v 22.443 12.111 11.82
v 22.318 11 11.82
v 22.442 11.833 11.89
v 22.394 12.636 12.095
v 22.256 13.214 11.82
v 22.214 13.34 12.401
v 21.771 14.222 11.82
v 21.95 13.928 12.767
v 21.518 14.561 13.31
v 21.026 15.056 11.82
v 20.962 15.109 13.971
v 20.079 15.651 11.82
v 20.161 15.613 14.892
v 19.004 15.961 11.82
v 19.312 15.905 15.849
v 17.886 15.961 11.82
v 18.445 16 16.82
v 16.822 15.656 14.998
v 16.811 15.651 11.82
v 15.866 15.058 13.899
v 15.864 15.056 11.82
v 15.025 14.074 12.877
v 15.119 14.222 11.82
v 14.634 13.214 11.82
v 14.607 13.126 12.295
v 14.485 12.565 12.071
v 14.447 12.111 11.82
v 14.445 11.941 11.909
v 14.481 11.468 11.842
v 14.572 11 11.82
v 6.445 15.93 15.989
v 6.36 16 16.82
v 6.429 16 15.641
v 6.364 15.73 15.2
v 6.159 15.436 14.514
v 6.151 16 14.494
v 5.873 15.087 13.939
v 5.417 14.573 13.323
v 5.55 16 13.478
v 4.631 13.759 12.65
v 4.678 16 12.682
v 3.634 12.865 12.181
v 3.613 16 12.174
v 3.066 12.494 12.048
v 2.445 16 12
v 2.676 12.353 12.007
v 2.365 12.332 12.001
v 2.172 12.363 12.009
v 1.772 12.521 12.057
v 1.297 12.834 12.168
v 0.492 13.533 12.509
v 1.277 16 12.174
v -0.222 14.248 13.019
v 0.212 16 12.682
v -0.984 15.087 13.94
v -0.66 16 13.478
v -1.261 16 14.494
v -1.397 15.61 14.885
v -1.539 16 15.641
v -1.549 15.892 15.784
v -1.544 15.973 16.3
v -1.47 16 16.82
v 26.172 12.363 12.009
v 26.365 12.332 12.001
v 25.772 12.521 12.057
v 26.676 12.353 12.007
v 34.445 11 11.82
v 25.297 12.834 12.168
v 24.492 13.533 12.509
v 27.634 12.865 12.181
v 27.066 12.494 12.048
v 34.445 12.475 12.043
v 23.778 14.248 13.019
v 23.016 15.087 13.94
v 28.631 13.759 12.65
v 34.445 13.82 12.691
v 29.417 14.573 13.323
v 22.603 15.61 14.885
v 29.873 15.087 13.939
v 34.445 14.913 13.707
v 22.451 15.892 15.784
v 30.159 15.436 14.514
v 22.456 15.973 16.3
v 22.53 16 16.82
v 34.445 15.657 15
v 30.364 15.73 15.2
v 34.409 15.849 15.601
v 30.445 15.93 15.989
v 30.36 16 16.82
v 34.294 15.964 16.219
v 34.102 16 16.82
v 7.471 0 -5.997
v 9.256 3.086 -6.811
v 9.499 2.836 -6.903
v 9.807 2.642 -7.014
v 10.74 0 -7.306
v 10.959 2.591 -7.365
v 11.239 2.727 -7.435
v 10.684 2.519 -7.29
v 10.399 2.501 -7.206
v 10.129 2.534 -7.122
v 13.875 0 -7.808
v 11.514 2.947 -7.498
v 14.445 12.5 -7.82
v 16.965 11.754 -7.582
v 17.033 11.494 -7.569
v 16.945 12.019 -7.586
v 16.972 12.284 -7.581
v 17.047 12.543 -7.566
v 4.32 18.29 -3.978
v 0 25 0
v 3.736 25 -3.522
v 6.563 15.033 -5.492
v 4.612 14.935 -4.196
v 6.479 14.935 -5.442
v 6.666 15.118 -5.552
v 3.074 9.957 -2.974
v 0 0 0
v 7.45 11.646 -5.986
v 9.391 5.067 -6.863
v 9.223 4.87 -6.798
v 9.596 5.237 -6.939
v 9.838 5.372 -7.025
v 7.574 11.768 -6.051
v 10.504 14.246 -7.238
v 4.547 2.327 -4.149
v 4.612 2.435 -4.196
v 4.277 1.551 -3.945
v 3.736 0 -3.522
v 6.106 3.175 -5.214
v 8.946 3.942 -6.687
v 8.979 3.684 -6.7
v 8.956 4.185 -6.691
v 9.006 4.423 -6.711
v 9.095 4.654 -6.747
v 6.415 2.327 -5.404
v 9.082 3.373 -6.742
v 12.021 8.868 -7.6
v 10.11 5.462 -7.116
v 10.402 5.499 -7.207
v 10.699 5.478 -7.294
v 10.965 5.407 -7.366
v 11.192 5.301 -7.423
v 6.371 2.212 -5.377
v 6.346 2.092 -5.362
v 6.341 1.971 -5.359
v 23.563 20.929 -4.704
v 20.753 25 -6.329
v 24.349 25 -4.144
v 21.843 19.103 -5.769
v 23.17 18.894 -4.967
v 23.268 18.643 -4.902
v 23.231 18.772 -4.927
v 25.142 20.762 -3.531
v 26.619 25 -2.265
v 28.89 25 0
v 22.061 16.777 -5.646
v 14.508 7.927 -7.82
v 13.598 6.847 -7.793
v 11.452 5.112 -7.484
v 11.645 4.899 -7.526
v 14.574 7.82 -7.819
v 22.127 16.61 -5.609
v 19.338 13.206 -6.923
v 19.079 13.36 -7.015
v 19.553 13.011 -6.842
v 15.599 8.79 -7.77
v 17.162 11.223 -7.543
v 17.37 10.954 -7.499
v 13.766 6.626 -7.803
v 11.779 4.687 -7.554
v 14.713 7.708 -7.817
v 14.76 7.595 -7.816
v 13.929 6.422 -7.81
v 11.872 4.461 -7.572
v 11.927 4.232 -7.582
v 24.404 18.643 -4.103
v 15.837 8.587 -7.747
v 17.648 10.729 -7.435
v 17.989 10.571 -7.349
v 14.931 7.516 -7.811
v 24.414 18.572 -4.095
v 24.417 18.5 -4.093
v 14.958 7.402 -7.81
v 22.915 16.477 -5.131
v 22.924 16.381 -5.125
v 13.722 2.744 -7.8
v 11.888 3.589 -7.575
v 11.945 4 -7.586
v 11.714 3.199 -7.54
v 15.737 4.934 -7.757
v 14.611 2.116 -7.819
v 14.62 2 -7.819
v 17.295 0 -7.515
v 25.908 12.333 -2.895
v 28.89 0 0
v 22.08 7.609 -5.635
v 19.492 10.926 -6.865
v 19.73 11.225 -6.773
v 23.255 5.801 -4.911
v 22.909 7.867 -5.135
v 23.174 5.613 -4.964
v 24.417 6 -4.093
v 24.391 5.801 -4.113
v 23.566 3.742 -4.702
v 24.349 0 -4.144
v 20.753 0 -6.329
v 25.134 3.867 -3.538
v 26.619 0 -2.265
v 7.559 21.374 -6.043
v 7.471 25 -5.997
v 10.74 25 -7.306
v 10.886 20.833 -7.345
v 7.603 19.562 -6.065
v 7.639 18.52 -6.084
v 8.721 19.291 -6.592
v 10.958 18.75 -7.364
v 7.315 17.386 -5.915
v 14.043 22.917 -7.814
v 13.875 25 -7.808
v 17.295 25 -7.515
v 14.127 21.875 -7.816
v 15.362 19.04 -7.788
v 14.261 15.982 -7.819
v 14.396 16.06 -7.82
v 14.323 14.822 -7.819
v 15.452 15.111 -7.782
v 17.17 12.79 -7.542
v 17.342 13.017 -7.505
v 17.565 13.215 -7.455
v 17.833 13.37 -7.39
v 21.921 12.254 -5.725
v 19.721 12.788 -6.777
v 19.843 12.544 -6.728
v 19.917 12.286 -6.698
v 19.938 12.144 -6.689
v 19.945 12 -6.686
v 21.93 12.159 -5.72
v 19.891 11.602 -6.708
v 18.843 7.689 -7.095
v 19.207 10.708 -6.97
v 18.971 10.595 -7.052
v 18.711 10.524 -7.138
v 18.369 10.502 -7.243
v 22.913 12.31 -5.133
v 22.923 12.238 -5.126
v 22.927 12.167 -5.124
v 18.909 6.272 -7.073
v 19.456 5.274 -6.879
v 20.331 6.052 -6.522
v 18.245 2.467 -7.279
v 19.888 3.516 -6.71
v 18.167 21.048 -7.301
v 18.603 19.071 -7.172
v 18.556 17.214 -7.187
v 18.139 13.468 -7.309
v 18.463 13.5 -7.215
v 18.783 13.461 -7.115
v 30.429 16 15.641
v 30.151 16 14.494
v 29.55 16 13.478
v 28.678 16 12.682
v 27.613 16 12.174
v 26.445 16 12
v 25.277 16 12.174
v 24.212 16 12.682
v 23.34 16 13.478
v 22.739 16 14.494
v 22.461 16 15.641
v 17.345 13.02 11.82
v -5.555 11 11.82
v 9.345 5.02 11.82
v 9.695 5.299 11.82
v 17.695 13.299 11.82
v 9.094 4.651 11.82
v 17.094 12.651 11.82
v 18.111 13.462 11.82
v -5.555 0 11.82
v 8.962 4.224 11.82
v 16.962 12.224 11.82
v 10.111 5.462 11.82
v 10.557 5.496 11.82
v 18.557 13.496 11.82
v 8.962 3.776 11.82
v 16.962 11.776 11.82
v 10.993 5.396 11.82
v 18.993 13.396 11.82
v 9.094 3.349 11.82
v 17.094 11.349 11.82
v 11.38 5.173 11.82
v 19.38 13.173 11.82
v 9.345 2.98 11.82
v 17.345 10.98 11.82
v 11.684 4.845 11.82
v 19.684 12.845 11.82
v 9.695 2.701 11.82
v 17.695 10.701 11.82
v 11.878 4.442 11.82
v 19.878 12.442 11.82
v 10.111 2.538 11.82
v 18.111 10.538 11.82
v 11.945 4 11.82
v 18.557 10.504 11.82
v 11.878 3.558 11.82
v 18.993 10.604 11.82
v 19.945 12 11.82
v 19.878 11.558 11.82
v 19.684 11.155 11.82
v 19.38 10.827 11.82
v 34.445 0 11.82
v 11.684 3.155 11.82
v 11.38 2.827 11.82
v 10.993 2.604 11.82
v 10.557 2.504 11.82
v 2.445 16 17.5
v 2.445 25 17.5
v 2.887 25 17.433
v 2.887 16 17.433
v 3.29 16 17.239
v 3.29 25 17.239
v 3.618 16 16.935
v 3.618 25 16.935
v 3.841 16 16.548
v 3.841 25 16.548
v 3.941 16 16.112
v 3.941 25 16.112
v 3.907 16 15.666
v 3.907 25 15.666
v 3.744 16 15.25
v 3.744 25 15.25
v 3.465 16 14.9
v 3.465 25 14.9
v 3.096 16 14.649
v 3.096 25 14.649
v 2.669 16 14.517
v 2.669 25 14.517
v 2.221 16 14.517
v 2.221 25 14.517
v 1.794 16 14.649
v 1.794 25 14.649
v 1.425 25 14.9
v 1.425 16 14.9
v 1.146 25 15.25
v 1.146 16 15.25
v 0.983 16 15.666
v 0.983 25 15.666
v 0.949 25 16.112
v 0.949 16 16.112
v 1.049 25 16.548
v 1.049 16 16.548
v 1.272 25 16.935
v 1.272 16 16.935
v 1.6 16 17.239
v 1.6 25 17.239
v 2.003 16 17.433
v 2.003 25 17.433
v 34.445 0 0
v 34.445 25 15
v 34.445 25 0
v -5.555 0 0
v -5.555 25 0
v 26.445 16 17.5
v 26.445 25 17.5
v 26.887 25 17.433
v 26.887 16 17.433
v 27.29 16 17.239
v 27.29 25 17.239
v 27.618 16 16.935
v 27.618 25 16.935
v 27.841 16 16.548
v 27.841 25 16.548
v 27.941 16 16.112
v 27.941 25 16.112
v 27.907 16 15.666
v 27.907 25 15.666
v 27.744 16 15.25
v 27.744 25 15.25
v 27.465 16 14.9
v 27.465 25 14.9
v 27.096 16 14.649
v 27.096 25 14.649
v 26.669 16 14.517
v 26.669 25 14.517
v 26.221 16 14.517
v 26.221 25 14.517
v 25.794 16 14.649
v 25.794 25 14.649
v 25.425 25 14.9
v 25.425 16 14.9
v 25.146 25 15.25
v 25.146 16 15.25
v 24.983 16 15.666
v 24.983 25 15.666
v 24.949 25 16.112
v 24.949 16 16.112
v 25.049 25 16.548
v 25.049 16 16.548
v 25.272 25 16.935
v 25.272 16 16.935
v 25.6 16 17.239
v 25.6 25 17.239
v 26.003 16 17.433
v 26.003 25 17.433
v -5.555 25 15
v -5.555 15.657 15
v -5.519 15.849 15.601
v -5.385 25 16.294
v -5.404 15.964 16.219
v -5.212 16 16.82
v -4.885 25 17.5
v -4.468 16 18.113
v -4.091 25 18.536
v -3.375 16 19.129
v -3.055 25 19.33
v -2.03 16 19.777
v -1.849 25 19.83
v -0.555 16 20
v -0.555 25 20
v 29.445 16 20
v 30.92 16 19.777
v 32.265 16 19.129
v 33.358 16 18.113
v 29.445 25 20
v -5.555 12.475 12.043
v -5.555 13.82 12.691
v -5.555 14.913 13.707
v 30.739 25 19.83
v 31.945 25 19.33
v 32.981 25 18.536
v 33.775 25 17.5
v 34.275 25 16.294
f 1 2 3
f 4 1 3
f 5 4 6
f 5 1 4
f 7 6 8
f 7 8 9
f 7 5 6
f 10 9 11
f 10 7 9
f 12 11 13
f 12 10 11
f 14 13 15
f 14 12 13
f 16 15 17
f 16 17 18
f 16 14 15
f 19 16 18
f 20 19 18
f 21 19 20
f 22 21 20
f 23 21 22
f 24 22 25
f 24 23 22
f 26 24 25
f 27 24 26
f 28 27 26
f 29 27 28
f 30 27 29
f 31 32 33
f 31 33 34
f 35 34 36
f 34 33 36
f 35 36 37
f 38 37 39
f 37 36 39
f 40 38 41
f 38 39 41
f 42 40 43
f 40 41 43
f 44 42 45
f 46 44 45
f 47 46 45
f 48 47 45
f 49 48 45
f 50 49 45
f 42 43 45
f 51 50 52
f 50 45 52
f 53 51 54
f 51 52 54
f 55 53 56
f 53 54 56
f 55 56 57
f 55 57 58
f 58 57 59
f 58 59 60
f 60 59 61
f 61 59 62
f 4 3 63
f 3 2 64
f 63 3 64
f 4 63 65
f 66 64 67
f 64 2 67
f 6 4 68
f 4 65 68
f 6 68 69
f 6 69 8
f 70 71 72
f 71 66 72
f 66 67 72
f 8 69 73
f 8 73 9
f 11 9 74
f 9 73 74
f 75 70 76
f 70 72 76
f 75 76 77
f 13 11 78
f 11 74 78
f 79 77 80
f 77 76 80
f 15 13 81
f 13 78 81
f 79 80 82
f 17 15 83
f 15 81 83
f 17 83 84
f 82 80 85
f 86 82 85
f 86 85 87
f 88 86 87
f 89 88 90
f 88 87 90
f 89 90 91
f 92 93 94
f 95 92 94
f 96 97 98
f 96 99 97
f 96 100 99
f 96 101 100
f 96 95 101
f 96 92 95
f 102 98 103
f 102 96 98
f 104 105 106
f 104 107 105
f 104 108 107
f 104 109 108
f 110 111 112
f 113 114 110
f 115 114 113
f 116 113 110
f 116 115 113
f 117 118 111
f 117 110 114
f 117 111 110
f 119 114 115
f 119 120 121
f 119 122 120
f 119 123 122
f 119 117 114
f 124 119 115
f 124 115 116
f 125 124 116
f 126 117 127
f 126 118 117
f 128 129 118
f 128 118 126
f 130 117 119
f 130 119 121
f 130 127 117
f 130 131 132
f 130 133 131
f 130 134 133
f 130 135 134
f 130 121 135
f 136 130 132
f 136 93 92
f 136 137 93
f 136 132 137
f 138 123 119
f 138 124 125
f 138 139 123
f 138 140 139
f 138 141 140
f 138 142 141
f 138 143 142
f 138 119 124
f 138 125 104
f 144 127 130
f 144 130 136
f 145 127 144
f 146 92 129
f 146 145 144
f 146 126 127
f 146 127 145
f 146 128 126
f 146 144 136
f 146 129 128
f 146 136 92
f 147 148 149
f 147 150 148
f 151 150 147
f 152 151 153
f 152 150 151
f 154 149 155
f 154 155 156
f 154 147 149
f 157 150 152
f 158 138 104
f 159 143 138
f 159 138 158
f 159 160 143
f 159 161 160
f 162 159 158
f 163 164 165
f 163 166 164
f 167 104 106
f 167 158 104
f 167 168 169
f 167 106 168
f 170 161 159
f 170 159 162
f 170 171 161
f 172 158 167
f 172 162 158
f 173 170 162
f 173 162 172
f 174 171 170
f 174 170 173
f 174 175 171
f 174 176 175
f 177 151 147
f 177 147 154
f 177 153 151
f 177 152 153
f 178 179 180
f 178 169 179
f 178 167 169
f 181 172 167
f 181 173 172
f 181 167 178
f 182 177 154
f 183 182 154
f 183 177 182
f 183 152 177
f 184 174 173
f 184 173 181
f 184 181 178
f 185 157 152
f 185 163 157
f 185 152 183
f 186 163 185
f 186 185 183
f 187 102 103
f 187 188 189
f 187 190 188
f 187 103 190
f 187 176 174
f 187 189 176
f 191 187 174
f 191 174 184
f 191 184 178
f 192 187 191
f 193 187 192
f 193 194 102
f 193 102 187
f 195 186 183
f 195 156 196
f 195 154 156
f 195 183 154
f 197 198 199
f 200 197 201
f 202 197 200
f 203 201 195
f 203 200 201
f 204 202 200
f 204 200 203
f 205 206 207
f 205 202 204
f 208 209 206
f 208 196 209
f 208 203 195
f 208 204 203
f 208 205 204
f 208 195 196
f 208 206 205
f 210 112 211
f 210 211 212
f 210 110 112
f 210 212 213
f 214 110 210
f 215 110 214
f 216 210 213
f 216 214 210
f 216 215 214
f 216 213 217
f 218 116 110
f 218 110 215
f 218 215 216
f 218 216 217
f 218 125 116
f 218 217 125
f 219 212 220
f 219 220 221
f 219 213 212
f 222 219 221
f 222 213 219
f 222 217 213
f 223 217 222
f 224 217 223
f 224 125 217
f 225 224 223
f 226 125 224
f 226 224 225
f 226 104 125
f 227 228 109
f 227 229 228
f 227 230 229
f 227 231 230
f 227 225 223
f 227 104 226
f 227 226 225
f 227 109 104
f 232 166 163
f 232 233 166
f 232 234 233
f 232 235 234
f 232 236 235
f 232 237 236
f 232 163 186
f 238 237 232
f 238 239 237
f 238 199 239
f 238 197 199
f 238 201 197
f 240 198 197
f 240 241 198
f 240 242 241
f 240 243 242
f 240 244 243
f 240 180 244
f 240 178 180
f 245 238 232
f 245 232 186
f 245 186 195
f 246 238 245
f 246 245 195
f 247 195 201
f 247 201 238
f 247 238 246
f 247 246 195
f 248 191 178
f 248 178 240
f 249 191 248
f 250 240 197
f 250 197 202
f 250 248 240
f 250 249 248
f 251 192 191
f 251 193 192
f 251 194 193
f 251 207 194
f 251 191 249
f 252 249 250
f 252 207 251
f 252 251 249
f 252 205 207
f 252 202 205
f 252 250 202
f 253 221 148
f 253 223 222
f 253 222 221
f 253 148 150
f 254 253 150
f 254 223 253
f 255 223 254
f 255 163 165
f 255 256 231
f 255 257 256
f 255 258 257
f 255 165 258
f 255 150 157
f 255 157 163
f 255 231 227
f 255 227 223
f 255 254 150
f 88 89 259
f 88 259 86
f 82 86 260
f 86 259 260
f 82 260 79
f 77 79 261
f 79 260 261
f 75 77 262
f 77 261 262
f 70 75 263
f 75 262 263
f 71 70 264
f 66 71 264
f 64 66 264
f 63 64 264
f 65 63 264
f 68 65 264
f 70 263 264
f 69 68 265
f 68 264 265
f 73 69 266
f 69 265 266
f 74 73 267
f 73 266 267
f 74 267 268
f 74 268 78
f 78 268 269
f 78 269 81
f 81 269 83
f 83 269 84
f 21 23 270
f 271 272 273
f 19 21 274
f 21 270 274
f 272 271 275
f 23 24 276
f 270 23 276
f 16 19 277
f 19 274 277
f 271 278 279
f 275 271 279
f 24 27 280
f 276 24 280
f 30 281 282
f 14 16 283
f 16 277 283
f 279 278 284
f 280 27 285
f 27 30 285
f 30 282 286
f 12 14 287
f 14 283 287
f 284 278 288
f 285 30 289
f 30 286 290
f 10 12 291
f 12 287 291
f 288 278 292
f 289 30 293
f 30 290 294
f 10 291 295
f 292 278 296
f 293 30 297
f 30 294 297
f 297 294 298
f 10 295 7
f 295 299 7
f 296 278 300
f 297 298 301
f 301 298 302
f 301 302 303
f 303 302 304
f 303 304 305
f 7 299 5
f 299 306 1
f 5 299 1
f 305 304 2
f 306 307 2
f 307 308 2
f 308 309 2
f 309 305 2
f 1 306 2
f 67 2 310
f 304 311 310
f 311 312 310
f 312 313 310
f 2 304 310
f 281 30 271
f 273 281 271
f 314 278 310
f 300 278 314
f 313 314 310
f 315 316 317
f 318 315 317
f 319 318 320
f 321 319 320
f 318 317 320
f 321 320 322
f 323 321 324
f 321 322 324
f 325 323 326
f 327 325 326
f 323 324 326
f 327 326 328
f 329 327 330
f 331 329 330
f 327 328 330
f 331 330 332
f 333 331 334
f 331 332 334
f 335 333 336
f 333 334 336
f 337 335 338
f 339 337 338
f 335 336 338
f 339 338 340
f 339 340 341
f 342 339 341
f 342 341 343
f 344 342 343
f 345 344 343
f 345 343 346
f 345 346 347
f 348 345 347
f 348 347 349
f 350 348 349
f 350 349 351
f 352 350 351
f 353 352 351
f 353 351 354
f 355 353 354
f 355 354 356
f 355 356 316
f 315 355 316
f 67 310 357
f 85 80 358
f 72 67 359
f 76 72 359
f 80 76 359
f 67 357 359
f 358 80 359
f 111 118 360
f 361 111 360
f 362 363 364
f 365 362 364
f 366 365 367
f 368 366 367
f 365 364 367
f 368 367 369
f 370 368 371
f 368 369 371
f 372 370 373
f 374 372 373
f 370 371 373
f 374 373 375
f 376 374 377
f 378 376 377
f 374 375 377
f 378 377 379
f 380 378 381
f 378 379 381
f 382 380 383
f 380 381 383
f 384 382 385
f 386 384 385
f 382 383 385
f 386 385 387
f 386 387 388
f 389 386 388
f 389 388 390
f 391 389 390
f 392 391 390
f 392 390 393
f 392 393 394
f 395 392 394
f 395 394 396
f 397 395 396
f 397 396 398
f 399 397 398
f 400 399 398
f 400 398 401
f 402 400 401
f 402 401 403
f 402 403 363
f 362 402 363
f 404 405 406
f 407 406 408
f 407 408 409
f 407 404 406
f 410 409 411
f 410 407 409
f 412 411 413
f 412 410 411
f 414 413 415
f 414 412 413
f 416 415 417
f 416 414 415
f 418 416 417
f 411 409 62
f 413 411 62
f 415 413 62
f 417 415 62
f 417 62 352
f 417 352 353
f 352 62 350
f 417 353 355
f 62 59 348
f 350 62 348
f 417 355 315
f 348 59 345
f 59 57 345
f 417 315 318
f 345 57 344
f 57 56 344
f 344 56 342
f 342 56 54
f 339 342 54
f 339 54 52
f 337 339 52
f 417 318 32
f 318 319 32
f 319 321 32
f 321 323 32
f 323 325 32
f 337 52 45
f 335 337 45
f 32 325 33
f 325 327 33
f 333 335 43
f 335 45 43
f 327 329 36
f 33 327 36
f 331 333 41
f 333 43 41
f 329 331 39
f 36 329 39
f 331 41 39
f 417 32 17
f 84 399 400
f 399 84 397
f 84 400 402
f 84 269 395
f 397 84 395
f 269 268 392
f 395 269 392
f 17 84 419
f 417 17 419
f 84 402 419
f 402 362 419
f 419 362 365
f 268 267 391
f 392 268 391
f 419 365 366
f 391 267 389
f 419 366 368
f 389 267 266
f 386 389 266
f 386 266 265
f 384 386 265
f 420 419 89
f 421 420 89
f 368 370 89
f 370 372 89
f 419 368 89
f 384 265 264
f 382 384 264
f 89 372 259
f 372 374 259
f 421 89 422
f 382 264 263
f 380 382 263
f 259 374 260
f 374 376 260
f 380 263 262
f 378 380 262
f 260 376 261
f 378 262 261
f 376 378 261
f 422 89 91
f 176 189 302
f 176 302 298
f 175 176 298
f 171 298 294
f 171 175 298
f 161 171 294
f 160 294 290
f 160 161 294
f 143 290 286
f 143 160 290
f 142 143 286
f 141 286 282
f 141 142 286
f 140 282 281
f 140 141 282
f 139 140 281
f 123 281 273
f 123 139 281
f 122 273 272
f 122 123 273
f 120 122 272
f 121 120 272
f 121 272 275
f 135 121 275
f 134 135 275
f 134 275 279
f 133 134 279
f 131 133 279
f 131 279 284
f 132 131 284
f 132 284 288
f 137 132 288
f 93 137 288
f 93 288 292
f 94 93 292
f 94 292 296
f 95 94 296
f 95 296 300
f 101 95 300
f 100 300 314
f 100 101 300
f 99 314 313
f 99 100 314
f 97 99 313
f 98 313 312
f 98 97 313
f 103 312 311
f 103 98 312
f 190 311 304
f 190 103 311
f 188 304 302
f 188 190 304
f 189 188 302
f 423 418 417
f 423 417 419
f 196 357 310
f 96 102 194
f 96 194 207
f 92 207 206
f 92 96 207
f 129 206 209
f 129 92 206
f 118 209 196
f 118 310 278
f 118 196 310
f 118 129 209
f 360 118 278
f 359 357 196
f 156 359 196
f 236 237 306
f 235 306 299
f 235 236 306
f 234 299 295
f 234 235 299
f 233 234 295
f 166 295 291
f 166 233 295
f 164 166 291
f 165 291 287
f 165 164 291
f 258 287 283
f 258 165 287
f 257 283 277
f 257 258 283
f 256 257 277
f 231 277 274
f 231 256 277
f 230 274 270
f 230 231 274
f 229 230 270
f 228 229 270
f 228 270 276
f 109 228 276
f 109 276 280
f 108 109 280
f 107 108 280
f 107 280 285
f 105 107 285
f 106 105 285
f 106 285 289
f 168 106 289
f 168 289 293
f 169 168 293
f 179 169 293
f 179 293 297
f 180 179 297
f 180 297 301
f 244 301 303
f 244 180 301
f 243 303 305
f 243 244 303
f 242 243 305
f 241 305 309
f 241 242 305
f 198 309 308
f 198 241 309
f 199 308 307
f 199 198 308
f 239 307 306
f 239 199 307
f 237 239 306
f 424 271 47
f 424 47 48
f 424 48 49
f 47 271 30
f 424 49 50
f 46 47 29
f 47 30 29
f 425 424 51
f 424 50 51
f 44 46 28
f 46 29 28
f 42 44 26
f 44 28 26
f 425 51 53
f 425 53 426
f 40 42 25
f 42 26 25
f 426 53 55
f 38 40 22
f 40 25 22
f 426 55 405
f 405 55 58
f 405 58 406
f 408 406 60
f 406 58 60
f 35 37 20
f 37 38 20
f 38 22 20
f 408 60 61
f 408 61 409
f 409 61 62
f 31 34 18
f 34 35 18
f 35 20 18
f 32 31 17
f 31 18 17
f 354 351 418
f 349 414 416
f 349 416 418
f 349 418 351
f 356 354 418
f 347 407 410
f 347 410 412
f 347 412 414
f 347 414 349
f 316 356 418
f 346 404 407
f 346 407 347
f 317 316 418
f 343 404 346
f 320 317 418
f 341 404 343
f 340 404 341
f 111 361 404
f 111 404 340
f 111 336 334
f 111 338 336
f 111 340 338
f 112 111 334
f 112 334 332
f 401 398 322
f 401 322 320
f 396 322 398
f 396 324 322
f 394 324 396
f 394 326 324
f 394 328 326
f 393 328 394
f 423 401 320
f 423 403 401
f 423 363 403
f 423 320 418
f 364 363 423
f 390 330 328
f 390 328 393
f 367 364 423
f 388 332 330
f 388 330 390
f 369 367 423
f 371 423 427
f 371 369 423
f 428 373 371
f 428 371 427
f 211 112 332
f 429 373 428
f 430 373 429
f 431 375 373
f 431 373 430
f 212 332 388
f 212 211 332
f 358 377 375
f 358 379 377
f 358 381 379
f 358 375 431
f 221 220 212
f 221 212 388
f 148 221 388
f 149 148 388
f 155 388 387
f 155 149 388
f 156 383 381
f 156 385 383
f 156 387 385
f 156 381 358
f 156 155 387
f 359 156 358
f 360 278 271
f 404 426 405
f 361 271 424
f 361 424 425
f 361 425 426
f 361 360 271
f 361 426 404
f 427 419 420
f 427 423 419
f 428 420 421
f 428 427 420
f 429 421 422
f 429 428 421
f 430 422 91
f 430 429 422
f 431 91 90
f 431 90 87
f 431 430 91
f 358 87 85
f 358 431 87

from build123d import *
from build123d.topology import SkipClean

# Parameters (mm, degrees)
BOSS_EXTRUDE1_DEPTH     = 25
SKETCH2_W               = 40
SKETCH2_H               = 9
BOSS_EXTRUDE2_DEPTH     = 8.18
FILLET1_R               = 5
CUT_EXTRUDE1_DEPTH      = 47.874168161
CUT_EXTRUDE1_DEPTH_BACK = 47.874168161
SKETCH3_R               = 1.5
SKETCH3_4_R             = 4
CUT_EXTRUDE6_DEPTH      = 47.874168161
SKETCH6_R               = 1.5
CUT_EXTRUDE7_DEPTH      = 48.026142101
CUT_EXTRUDE8_START      = -9
SKETCH6_3_R             = 4
CUT_EXTRUDE8_DEPTH      = 40
FILLET2_R               = 5


with BuildPart() as part:
    # Sketch1 → Boss-Extrude1 (new body)
    with BuildSketch(Plane(origin=(0, 0, 0), x_dir=(1, 0, 0), z_dir=(0, 1, 0))):
        with BuildLine():
            add(Edge.make_bspline(
                [(0, 0), (14.445, 15.64), (28.89, 0)],
                knots=[0, 0, 0, 1, 1, 1], degree=2))
            Line((28.89, 0), (0, 0))
        make_face()
        Polygon((-5.555, -11.82), (34.445, -11.82), (34.445, 0), (28.89, 0), (0, 0), (-5.555, 0), align=None)
    extrude(amount=BOSS_EXTRUDE1_DEPTH)

    # Sketch2 → Boss-Extrude2 (add)
    with BuildSketch(Plane.XY.offset(11.82)):
        with Locations((14.445, 20.5)):
            Rectangle(SKETCH2_W, SKETCH2_H)
    extrude(amount=BOSS_EXTRUDE2_DEPTH)

    # Fillet1
    fillet1_edges = [part.edges().sort_by_distance(p)[0] for p in [
        (14.445, 16, 11.82),
    ]]
    fillet(fillet1_edges, radius=FILLET1_R)

    # Sketch3 → Cut-Extrude1 (cut, two sides: drawn at the far end of the back side and taken through both)
    with BuildSketch(Plane.XY.offset(11.82).offset(-CUT_EXTRUDE1_DEPTH_BACK)):
        with Locations((18.445, 12)):
            Circle(SKETCH3_R)
        with Locations((10.445, 4)):
            Circle(SKETCH3_R)
    extrude(amount=CUT_EXTRUDE1_DEPTH + CUT_EXTRUDE1_DEPTH_BACK, mode=Mode.SUBTRACT)

    # Sketch3<4> → Cut-Extrude6 (cut, through all)
    with SkipClean():  # the faces are left unmerged after this step: merging them gives an invalid solid
        with BuildSketch(Plane.XY.offset(11.82)):
            with Locations((18.445, 12)):
                Circle(SKETCH3_4_R)
        extrude(amount=CUT_EXTRUDE6_DEPTH, mode=Mode.SUBTRACT)

    # Sketch6 → Cut-Extrude7 (cut, through all)
    with SkipClean():  # the faces are left unmerged after this step: merging them gives an invalid solid
        with BuildSketch(Plane(origin=(0, 25, 0), x_dir=(1, 0, 0), z_dir=(0, 1, 0))):
            with Locations(Location((2.445, -16, 0), (0, 0, 270))):
                Circle(SKETCH6_R)
            with Locations(Location((26.445, -16, 0), (0, 0, 270))):
                Circle(SKETCH6_R)
        extrude(amount=-CUT_EXTRUDE7_DEPTH, mode=Mode.SUBTRACT)

    # Sketch6<3> → Cut-Extrude8 (cut)
    with SkipClean():  # the faces are left unmerged after this step: merging them gives an invalid solid
        with BuildSketch(Plane(origin=(0, 25, 0), x_dir=(1, 0, 0), z_dir=(0, 1, 0)).offset(CUT_EXTRUDE8_START)):
            with Locations((2.445, -16)):
                Circle(SKETCH6_3_R)
            with Locations((26.445, -16)):
                Circle(SKETCH6_3_R)
        extrude(amount=-CUT_EXTRUDE8_DEPTH, mode=Mode.SUBTRACT)

    # Fillet2
    fillet2_edges = [part.edges().sort_by_distance(p)[0] for p in [
        (34.445, 20.5, 20),
        (-5.555, 20.5, 20),
    ]]
    fillet(fillet2_edges, radius=FILLET2_R)


solid = part.part
